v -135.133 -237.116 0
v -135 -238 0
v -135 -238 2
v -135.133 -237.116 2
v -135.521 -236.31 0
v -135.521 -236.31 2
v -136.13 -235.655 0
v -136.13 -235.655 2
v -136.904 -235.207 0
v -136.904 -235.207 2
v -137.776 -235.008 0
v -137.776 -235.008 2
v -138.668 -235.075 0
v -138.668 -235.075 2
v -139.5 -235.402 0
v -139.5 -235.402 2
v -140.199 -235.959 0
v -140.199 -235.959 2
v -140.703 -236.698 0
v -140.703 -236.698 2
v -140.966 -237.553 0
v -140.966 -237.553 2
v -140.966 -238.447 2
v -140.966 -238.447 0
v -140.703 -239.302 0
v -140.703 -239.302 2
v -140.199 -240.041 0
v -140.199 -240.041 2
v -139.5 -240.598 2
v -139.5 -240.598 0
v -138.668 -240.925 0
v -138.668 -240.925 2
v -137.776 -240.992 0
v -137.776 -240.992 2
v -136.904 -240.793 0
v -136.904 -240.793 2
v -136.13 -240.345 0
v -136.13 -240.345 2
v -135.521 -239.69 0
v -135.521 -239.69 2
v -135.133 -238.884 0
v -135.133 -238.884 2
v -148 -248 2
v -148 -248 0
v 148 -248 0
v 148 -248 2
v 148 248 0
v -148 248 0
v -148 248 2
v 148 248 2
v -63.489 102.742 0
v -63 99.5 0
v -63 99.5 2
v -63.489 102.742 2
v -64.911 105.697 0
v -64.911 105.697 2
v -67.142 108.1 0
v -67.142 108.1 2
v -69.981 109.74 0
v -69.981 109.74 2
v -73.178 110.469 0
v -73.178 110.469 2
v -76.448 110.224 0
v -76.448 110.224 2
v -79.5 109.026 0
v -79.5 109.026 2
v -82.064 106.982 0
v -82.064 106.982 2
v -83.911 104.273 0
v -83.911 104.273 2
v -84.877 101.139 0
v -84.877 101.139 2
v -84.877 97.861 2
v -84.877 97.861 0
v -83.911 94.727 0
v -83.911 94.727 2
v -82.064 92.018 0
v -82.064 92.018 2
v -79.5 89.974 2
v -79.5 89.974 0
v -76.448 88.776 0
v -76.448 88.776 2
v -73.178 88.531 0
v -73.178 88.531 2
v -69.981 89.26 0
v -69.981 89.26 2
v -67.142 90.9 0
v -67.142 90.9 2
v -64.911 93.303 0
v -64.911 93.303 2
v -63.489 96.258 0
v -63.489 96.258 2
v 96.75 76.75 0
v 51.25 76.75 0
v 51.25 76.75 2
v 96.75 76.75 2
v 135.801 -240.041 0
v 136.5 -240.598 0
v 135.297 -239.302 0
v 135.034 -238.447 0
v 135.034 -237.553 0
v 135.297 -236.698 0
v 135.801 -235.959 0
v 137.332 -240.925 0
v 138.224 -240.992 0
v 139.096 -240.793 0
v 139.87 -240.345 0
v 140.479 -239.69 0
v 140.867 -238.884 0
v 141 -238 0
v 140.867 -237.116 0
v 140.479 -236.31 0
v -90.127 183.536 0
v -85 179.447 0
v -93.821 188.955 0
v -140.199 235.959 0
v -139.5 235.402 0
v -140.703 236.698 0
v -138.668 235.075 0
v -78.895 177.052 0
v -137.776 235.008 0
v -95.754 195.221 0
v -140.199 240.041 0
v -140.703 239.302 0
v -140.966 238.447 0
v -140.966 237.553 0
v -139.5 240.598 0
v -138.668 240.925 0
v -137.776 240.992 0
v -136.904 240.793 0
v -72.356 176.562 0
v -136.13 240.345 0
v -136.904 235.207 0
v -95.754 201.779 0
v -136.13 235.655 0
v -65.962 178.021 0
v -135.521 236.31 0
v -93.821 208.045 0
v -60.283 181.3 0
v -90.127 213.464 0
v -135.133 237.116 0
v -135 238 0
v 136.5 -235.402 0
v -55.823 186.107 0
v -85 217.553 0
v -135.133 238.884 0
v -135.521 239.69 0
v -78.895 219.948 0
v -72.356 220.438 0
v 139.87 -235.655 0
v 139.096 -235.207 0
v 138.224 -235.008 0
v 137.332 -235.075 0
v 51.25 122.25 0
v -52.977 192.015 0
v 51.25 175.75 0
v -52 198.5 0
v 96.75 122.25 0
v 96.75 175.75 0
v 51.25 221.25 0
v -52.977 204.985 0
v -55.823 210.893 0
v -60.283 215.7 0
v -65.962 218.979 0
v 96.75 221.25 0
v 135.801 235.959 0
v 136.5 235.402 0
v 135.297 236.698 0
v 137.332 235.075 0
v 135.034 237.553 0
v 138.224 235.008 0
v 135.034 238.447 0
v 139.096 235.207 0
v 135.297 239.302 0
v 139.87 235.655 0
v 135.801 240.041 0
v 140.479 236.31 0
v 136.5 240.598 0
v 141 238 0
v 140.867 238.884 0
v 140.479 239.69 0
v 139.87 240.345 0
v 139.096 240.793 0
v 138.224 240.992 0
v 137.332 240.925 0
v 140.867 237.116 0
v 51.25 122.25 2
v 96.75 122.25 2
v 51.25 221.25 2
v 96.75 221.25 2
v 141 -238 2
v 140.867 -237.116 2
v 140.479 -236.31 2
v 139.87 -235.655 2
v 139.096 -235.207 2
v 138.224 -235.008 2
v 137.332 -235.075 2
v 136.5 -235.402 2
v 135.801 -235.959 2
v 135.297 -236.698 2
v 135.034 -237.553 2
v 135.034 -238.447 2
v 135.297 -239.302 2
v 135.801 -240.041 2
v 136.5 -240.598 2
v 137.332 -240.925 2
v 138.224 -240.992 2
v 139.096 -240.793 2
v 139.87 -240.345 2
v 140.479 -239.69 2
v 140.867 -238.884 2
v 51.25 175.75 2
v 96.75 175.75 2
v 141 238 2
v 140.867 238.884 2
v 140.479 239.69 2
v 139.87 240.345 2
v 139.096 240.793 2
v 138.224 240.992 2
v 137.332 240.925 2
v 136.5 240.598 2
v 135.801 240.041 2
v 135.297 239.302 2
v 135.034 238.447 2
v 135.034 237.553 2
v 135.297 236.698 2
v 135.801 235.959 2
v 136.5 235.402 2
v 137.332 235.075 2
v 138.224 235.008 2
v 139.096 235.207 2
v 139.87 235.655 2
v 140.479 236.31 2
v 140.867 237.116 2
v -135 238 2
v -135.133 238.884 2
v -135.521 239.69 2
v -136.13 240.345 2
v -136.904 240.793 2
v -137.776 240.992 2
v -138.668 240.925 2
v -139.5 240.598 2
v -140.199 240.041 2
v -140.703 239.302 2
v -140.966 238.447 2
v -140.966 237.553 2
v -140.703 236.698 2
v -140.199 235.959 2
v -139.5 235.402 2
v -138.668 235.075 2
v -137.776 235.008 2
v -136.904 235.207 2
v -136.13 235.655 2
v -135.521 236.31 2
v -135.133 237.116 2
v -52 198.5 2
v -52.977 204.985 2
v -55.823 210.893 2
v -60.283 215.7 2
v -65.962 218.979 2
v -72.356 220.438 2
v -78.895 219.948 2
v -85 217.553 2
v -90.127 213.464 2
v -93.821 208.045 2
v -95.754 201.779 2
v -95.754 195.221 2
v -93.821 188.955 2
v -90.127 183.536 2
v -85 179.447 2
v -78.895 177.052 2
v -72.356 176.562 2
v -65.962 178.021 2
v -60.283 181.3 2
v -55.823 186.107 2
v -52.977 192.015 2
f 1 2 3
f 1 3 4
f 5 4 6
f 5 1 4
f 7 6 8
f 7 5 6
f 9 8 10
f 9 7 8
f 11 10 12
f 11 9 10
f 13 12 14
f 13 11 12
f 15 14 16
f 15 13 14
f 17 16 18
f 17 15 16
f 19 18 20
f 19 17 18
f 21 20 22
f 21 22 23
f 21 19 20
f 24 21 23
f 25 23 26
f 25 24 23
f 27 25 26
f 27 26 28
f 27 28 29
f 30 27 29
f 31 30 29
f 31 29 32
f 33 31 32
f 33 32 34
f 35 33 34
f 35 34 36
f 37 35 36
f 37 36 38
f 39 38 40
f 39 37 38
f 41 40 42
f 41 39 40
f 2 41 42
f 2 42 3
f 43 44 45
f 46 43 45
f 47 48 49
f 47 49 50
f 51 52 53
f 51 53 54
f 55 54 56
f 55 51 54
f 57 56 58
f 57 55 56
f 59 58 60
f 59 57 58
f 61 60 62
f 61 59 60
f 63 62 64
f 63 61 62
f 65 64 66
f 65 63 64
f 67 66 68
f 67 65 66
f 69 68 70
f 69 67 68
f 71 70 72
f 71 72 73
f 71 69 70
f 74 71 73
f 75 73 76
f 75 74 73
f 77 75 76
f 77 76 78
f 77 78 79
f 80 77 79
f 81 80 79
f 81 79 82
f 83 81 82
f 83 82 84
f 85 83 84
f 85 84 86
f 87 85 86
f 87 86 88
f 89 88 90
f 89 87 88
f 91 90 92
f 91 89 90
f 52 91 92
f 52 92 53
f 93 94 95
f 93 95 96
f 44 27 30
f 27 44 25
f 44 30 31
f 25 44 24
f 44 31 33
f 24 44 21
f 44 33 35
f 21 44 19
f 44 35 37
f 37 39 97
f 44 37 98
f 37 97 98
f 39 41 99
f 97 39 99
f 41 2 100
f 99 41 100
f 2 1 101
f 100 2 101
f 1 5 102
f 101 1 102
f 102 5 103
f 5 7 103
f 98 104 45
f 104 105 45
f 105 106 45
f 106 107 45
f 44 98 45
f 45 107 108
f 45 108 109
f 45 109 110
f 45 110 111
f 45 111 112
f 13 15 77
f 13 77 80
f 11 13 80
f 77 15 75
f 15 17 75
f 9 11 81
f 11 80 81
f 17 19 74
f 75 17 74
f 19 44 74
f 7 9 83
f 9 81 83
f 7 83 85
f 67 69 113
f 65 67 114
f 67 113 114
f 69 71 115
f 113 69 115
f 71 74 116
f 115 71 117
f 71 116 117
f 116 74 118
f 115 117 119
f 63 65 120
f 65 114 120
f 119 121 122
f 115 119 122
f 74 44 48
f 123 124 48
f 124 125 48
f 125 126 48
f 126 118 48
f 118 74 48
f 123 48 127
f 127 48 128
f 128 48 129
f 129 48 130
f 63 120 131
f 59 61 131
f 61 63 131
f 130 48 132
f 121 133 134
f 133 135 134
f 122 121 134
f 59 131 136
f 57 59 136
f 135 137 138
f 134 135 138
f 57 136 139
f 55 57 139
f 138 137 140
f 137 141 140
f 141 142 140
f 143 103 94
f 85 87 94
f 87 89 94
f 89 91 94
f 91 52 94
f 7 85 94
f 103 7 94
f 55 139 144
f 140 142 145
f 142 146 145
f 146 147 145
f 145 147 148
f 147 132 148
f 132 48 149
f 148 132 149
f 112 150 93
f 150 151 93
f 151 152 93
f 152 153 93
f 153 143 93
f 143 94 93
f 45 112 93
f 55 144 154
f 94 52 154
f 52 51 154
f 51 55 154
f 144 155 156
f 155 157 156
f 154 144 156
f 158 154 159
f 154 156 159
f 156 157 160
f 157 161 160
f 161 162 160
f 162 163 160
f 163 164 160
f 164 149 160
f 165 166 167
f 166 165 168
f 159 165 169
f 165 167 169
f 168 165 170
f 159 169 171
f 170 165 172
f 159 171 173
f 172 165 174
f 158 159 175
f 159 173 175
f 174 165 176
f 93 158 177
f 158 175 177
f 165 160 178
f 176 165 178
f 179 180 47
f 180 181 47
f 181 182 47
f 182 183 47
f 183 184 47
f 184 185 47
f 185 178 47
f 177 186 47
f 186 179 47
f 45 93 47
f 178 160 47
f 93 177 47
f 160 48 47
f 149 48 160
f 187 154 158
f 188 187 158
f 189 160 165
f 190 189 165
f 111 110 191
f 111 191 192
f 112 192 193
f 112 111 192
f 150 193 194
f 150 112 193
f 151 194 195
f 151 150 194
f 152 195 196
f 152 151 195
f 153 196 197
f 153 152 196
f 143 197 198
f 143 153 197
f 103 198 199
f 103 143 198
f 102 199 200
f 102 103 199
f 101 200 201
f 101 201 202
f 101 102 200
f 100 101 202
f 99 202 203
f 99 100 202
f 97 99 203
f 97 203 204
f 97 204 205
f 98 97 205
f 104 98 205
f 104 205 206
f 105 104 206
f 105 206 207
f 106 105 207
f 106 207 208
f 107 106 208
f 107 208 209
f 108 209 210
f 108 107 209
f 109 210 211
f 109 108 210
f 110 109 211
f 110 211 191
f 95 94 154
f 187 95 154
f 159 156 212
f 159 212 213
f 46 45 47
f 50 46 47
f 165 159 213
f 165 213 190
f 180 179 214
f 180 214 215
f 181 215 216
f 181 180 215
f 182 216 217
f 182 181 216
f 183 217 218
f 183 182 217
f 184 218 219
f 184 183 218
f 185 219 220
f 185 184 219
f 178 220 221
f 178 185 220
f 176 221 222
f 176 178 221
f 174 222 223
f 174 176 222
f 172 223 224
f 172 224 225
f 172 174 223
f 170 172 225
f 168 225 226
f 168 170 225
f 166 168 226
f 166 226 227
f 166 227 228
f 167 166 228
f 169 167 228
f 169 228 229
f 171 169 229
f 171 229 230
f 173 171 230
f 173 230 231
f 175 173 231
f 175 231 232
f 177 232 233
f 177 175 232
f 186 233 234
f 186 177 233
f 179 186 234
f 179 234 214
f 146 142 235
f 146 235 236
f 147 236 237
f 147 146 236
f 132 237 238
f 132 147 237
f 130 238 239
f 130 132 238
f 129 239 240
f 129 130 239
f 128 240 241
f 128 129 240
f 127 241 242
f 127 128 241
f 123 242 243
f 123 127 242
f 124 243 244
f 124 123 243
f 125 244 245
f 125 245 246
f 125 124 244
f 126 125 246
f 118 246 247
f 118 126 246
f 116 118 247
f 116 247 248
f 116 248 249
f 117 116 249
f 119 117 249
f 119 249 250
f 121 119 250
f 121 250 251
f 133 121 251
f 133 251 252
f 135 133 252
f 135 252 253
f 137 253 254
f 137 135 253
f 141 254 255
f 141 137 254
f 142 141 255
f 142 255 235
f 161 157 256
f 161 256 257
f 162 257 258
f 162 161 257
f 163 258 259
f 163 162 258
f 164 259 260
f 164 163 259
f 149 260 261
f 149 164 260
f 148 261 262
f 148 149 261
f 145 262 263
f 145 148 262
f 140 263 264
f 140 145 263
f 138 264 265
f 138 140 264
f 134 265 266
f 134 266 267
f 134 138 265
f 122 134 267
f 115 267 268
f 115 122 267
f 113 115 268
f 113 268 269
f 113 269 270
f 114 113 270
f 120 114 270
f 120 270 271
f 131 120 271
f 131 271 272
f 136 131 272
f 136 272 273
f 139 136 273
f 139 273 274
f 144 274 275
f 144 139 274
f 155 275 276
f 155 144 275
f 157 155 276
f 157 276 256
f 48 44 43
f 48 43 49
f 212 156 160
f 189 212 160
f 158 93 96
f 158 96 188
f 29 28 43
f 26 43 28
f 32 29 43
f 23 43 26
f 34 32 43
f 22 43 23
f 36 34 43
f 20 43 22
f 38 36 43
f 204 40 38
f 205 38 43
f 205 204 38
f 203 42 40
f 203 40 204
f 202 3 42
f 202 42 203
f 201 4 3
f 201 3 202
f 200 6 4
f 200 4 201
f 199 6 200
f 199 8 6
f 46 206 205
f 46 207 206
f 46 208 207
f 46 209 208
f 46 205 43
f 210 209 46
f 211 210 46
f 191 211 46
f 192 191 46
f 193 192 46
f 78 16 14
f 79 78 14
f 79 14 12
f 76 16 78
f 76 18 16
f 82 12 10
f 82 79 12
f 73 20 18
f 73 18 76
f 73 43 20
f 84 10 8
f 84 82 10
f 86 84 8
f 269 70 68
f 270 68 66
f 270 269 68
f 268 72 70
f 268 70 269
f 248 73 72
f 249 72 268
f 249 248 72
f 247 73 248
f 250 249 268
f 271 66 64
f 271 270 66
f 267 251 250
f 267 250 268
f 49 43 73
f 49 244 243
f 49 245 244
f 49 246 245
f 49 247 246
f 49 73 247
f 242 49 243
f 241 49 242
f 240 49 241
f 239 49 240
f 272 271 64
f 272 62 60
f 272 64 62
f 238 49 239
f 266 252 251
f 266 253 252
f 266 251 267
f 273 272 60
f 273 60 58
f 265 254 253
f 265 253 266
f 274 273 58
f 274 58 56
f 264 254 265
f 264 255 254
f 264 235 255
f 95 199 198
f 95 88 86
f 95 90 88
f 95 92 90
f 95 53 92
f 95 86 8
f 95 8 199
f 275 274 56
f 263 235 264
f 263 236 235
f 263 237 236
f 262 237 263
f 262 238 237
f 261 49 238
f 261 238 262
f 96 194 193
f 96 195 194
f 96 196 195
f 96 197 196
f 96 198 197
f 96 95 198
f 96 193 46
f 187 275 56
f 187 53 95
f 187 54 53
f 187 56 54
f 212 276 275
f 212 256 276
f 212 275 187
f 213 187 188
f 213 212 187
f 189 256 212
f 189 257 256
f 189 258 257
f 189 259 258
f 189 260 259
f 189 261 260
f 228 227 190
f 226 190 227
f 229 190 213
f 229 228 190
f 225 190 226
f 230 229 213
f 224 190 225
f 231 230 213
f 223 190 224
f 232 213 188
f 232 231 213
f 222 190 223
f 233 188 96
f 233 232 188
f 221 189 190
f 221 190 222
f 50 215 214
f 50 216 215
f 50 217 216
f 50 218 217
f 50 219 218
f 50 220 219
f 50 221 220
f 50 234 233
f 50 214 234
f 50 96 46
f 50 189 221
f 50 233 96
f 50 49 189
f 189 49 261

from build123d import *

# Parameters (mm, degrees)
SKETCH1_W           = 296
SKETCH1_H           = 496
SKETCH1_R           = 11
SKETCH1_R_2         = 22
SKETCH1_R_3         = 3
SKETCH1_W_2         = 45.5
SKETCH1_H_2         = 45.5
BOSS_EXTRUDE1_DEPTH = 2


with BuildPart() as part:
    # Sketch1 → Boss-Extrude1 (new body)
    with BuildSketch(Plane.XY):
        Rectangle(SKETCH1_W, SKETCH1_H)
        with Locations((-74, 99.5)):
            Circle(SKETCH1_R, mode=Mode.SUBTRACT)
        with Locations((-74, 198.5)):
            Circle(SKETCH1_R_2, mode=Mode.SUBTRACT)
        with Locations((-138, 238)):
            Circle(SKETCH1_R_3, mode=Mode.SUBTRACT)
        with Locations((138, 238)):
            Circle(SKETCH1_R_3, mode=Mode.SUBTRACT)
        with Locations((-138, -238)):
            Circle(SKETCH1_R_3, mode=Mode.SUBTRACT)
        with Locations((138, -238)):
            Circle(SKETCH1_R_3, mode=Mode.SUBTRACT)
        with Locations((74, 198.5)):
            Rectangle(SKETCH1_W_2, SKETCH1_H_2, mode=Mode.SUBTRACT)
        with Locations((74, 99.5)):
            Rectangle(SKETCH1_W_2, SKETCH1_H_2, mode=Mode.SUBTRACT)
    extrude(amount=BOSS_EXTRUDE1_DEPTH)


solid = part.part
